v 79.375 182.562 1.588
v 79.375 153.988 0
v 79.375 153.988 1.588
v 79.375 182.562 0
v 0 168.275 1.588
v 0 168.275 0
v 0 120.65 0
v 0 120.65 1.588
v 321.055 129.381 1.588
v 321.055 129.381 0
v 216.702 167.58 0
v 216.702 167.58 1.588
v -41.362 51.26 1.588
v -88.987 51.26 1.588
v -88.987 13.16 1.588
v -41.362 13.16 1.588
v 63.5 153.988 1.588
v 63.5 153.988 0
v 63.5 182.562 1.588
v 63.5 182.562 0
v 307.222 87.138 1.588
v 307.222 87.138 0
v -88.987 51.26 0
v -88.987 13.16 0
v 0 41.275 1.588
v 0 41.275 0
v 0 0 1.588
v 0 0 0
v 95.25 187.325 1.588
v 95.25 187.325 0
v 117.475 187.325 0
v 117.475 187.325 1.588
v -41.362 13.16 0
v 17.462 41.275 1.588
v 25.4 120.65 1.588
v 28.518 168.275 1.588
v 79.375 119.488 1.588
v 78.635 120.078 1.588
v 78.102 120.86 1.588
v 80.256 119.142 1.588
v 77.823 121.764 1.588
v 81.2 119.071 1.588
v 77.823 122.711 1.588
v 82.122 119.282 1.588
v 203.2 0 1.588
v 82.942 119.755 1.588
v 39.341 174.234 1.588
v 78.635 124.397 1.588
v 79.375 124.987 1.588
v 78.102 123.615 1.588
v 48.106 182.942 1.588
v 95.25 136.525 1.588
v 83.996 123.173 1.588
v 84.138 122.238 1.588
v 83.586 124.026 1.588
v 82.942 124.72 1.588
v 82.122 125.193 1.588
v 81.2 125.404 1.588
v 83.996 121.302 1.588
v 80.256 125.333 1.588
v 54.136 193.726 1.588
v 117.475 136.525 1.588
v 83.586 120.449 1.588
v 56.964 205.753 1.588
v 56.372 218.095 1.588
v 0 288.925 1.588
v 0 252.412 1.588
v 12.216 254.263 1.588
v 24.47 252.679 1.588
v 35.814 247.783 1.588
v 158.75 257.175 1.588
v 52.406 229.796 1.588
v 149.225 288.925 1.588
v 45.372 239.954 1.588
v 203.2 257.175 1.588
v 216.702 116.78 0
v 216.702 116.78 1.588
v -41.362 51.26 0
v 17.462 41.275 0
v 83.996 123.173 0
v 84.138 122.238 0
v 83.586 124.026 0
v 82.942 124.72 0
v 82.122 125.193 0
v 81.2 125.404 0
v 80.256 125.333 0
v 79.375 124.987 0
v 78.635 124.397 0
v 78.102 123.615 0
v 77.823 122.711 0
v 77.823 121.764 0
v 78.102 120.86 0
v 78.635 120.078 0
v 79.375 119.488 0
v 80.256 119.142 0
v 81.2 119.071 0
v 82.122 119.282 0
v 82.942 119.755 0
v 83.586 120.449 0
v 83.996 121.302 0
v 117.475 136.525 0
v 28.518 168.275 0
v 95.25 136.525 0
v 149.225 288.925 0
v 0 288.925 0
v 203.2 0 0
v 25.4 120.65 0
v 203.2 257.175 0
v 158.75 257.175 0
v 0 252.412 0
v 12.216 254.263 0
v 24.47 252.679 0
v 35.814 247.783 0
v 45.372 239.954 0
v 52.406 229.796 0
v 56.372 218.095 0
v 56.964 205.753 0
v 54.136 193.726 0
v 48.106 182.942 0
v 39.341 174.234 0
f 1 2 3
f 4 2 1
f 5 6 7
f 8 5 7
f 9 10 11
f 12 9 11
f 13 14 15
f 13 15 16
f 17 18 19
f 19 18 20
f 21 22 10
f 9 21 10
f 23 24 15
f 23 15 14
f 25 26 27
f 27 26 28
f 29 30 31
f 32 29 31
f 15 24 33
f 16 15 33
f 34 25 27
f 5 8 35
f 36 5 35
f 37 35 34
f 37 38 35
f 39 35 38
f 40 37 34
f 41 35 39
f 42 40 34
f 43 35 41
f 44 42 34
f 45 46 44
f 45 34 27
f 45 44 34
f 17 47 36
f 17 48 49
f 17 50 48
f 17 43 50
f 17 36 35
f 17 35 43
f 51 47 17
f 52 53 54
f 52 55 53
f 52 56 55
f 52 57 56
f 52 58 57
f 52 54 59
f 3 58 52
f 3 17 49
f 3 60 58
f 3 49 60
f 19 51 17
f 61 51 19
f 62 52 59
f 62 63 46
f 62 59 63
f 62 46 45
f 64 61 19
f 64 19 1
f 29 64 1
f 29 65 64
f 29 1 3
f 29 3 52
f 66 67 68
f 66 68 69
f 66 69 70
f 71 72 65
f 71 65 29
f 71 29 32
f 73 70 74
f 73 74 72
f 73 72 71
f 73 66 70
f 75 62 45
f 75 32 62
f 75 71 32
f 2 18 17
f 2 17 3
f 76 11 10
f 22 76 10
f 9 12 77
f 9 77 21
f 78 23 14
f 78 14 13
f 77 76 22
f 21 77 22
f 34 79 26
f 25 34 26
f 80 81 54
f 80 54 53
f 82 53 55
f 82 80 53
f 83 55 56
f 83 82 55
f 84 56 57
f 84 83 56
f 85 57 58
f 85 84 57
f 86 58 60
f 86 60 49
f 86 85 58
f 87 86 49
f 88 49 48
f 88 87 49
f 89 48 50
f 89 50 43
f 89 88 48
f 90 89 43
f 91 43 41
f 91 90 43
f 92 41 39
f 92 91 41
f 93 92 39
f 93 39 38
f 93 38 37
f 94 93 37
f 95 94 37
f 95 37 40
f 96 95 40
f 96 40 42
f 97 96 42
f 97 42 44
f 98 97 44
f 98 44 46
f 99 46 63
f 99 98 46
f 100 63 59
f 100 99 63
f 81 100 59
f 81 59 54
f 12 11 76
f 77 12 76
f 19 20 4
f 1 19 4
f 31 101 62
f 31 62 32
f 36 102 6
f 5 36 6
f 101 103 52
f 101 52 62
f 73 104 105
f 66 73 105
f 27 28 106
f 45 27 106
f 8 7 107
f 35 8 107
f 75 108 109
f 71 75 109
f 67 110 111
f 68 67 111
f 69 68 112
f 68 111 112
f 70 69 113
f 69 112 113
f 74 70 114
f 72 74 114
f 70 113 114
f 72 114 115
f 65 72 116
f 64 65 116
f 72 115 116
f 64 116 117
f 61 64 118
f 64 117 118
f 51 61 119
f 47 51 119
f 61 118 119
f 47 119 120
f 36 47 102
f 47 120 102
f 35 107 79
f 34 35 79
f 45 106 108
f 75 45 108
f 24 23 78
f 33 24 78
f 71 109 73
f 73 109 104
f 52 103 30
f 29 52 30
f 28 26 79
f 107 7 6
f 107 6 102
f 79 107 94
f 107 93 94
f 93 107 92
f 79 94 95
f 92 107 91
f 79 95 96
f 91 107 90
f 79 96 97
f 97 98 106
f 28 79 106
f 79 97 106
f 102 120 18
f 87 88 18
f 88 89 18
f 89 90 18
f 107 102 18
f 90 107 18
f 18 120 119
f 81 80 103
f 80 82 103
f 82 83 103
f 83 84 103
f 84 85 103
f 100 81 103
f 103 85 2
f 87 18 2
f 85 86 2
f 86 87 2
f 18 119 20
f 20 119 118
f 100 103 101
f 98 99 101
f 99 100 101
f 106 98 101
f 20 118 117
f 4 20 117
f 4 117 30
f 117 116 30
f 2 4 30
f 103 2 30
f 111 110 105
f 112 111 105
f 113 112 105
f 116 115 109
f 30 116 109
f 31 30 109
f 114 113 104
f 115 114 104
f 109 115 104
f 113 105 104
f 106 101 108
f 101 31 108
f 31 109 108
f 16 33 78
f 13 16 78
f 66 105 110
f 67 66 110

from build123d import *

# Parameters (mm, degrees)
F0_R     = 3.175
F0_W     = 22.225
F0_H     = 50.8
F0_W_2   = 15.875
F0_H_2   = 28.575
F1_DEPTH = 1.5875
F2_DEPTH = 1.5875
F0_W_3   = 47.625
F0_H_3   = 38.1
F3_DEPTH = 1.5875


# Not quite as in the source:
# - a length typed as a fraction of an inch, garbled in the dataset ("3 / 203.2 mm" for 3/8 in), is restored


with BuildPart() as f1:
    # F0 (on Top) → F1 (new body)
    with BuildSketch(Plane.XY):
        with BuildLine():
            Line((0, 0), (203.2, 0))
            Line((203.2, 0), (203.2, 257.175))
            Line((203.2, 257.175), (158.75, 257.175))
            Line((158.75, 257.175), (149.225, 288.925))
            Line((149.225, 288.925), (0, 288.925))
            Line((0, 288.925), (0, 252.4125))
            ThreePointArc((0, 252.4125), (54.7976201519, 224.0840026314), (28.5176246655, 168.275))
            Line((28.5176246655, 168.275), (0, 168.275))
            Line((0, 168.275), (0, 120.65))
            Line((0, 120.65), (25.4, 120.65))
            Line((25.4, 120.65), (17.4625, 41.275))
            Line((17.4625, 41.275), (0, 41.275))
            Line((0, 41.275), (0, 0))
        make_face()
        with Locations((80.9625, 122.2375)):
            Circle(F0_R, mode=Mode.SUBTRACT)
        with Locations((106.3625, 161.925)):
            Rectangle(F0_W, F0_H, mode=Mode.SUBTRACT)
        with Locations((71.4375, 168.275)):
            Rectangle(F0_W_2, F0_H_2, mode=Mode.SUBTRACT)
    extrude(amount=F1_DEPTH)


with BuildPart() as f2:
    # F0 (on Top) → F2 (new body)
    with BuildSketch(Plane.XY):
        Polygon((321.0547220741, 129.3808330162), (216.7015462149, 167.5800517662), (216.7015462149, 116.7800517662), (307.221789279, 87.1380529197), align=None)
    extrude(amount=F2_DEPTH)


with BuildPart() as f3:
    # F0 (on Top) → F3 (new body)
    with BuildSketch(Plane.XY):
        with Locations((-65.1747573316, 32.2102343172)):
            Rectangle(F0_W_3, F0_H_3)
    extrude(amount=F3_DEPTH)


solid = Compound([f1.part, f2.part, f3.part])
